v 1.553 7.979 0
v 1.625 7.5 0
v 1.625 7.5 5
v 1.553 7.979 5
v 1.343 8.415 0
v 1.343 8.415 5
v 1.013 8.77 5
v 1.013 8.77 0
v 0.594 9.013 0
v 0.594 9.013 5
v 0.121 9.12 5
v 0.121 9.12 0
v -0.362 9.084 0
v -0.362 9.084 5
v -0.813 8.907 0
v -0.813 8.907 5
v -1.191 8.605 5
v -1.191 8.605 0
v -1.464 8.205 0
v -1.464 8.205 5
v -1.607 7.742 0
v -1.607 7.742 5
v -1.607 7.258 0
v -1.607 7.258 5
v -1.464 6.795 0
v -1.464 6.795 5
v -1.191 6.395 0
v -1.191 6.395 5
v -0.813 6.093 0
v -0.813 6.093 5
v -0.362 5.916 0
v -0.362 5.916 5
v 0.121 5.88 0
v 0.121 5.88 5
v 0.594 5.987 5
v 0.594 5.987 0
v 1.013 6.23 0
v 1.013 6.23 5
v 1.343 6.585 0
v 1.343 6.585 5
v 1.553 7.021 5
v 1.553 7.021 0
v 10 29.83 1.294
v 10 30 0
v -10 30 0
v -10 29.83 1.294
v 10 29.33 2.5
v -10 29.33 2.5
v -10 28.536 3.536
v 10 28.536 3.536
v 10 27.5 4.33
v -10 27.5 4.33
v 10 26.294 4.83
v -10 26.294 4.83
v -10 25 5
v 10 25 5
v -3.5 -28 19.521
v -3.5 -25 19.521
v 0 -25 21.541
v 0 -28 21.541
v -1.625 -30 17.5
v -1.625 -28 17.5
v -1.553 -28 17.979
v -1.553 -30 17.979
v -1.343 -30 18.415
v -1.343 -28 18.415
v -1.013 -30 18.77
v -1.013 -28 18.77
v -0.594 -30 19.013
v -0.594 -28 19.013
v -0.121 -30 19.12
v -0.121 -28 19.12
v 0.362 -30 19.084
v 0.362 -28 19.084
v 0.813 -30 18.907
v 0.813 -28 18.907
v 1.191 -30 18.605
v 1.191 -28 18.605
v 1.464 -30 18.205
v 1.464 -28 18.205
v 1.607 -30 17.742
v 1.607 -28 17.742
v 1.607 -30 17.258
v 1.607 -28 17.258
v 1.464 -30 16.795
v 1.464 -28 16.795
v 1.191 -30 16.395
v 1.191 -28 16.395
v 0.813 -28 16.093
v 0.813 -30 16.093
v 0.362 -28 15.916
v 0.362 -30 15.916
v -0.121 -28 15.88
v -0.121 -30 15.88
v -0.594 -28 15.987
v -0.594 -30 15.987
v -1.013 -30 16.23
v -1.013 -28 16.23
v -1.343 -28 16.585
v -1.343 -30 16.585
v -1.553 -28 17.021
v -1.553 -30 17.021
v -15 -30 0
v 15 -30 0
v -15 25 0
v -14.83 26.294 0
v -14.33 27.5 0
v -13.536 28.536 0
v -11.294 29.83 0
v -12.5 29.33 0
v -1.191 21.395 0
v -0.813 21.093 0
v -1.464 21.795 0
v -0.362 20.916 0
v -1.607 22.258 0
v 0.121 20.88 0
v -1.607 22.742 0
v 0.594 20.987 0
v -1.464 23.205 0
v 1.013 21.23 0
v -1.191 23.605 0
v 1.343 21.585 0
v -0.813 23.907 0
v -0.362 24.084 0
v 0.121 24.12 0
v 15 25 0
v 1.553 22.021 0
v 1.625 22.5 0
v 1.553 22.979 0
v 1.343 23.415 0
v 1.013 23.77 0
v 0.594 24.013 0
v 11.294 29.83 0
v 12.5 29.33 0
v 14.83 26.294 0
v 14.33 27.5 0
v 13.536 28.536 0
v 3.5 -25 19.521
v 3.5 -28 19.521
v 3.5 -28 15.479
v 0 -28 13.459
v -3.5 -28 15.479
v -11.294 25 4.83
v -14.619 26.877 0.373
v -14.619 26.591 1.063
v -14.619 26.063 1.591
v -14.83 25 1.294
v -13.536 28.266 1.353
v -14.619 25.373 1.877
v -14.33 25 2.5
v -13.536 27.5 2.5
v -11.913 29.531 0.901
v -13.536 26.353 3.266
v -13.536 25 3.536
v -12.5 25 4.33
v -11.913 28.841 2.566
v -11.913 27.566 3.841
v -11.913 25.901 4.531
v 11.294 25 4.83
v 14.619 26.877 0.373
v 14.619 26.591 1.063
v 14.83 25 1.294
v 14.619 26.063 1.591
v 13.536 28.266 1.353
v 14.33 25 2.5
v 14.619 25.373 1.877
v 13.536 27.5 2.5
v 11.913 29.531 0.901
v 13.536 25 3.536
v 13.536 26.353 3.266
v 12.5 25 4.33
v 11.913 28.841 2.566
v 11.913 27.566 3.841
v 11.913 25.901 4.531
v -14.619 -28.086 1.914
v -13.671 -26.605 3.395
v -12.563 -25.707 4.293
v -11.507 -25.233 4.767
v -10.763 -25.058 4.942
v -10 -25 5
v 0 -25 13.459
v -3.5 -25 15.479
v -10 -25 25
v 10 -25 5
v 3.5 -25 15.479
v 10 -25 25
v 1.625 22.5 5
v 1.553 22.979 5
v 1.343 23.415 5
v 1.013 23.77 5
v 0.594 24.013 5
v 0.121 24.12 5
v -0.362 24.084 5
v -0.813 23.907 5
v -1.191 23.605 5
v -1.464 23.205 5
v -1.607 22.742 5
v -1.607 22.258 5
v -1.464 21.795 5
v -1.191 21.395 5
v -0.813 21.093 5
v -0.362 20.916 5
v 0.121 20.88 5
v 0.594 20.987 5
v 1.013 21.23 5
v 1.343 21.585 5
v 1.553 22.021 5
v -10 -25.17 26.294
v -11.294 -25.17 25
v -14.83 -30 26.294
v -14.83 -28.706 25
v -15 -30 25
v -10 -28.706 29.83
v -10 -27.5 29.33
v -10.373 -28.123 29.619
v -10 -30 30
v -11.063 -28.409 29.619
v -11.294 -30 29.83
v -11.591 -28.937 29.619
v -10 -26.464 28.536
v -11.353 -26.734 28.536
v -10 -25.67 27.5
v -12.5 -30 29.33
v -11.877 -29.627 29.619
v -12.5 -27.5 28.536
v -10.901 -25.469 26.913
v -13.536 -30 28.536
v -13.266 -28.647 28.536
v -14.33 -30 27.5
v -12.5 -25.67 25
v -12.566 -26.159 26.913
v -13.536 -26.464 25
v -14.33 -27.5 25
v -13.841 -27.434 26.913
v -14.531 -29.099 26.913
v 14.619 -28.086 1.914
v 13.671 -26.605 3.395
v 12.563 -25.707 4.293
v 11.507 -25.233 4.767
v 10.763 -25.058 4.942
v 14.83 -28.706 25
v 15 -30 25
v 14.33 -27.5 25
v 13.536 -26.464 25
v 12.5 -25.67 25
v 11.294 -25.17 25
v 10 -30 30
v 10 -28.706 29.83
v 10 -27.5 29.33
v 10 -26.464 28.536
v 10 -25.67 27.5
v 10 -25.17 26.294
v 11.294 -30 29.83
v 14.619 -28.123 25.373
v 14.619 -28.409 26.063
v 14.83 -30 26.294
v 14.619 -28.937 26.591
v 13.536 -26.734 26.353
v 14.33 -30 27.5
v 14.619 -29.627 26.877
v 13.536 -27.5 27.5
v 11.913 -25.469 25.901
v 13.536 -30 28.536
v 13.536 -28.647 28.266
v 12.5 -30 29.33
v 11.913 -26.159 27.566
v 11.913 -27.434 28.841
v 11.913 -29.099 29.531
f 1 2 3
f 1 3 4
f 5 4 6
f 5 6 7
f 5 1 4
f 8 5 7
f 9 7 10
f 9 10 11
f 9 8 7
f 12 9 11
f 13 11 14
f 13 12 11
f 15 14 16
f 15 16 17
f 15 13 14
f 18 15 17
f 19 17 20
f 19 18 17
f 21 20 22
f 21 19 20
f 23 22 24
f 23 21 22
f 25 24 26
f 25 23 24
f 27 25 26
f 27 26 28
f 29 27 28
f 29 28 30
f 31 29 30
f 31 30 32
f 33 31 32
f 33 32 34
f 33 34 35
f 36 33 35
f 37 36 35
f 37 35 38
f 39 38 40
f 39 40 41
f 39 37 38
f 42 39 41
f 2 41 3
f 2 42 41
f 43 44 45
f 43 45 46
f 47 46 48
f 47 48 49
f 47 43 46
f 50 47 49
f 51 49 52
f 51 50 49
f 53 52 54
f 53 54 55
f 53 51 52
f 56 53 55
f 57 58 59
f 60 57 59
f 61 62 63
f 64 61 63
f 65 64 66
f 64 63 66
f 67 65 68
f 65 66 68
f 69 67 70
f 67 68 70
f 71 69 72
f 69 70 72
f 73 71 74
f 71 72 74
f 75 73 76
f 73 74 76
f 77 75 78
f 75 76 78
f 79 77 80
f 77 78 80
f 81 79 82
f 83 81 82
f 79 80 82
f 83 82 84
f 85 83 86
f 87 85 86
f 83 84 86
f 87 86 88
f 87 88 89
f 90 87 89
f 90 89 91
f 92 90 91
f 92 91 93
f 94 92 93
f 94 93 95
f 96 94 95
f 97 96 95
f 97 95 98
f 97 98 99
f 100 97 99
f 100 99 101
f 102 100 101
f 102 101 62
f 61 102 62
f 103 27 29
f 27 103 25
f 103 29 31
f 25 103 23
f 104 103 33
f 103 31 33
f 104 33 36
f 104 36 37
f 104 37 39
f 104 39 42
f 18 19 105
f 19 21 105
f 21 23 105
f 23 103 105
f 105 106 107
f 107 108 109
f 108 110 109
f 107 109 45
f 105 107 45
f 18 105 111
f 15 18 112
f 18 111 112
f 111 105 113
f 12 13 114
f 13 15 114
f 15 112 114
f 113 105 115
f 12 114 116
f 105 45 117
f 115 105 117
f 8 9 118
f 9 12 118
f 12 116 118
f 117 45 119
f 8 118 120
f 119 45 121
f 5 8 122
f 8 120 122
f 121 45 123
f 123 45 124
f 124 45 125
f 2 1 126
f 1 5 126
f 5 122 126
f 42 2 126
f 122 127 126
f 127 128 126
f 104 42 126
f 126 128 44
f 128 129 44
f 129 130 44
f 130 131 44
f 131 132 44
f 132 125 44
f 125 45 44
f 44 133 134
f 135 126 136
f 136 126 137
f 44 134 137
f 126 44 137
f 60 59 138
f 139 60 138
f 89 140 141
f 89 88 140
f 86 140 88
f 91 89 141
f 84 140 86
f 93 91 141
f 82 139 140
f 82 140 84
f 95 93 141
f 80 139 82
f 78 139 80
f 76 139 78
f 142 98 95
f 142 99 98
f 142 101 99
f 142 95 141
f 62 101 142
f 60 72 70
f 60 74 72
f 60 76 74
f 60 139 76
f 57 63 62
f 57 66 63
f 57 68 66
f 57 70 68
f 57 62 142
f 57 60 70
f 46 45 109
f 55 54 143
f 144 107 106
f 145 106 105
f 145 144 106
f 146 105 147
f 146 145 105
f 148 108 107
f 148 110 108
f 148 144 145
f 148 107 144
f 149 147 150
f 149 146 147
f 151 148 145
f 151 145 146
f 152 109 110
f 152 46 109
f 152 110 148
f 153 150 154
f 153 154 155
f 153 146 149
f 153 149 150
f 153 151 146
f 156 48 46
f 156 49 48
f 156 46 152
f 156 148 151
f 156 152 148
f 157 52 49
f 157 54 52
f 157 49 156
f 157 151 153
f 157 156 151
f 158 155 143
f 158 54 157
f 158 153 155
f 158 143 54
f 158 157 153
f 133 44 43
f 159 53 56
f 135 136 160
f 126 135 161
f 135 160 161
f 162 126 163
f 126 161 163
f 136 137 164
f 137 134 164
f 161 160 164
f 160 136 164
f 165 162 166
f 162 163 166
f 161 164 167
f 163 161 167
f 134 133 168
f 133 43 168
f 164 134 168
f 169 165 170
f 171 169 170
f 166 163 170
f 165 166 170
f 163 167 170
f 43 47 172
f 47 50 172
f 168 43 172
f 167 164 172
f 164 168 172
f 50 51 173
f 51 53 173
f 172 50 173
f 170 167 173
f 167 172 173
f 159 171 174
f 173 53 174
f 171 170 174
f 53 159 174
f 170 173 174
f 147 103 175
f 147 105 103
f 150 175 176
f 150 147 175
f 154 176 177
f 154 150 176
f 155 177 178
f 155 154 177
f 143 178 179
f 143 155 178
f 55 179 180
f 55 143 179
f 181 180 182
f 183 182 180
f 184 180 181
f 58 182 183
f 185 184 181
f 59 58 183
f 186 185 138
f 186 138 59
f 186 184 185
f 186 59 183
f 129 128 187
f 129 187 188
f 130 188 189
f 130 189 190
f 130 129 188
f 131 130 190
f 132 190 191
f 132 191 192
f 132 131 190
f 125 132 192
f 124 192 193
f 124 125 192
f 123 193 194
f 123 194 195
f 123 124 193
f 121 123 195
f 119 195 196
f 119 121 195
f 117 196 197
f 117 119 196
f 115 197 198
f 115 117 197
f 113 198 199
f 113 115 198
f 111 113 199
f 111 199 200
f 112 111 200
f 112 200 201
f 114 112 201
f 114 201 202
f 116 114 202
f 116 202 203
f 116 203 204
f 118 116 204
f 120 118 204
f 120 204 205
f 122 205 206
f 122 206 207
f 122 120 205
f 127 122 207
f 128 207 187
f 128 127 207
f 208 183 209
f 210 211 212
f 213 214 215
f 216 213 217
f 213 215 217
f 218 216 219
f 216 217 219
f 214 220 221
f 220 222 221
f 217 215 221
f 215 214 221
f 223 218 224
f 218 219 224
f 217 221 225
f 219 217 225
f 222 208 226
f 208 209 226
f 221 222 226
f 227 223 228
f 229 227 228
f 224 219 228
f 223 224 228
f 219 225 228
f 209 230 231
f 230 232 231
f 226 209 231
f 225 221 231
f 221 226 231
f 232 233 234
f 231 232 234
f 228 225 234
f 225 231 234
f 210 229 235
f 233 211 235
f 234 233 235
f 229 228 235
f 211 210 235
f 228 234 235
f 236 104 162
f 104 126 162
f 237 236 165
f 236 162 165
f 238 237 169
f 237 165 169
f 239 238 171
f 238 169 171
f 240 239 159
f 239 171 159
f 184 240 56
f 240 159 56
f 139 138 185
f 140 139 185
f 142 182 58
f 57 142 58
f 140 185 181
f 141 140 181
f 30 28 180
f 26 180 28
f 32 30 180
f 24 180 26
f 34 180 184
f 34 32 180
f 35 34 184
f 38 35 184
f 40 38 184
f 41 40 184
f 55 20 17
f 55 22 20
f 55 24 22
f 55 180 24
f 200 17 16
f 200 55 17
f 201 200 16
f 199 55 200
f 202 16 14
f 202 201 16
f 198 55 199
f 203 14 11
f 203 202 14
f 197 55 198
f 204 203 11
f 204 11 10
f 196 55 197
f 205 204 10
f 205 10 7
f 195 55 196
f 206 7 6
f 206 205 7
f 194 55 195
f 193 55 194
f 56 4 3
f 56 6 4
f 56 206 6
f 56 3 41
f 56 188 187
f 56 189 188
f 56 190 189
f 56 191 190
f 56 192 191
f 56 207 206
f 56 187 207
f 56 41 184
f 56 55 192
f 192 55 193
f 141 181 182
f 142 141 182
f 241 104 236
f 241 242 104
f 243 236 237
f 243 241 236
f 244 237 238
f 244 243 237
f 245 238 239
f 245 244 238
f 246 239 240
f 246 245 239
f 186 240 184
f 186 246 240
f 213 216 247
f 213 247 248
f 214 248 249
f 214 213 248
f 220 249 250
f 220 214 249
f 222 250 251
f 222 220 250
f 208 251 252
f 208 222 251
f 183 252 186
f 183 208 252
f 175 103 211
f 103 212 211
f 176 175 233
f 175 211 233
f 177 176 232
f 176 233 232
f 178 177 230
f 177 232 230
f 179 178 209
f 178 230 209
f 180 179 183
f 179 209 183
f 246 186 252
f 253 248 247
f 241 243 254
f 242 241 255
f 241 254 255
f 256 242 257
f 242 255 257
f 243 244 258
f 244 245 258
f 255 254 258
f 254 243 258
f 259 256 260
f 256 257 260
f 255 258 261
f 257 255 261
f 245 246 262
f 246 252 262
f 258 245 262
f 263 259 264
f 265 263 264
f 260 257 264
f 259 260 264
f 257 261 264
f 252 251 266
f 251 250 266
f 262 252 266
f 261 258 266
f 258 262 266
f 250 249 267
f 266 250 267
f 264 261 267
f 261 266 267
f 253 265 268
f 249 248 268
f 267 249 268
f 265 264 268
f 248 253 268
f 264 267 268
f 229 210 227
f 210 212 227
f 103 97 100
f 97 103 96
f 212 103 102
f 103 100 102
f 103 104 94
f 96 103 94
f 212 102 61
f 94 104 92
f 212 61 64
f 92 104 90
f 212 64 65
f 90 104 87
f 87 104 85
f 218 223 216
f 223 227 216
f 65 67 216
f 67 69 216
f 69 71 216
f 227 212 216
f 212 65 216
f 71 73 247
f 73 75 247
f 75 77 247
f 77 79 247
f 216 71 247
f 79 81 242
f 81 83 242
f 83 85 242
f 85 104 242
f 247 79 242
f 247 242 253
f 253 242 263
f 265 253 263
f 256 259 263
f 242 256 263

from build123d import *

# Parameters (mm, degrees)
F0_W     = 30
F0_H     = 60
F0_R     = 1.625
F1_DEPTH = 5
F2_W     = 5
F2_H     = 25
F3_DEPTH = 30
F4_R     = 1.625
F5_DEPTH = 25
F6_R     = 1.625
F7_DEPTH = 3
F8_R     = 4.99999


# Not quite as in the source:
# - a fillet or chamfer is up to 0.001 mm smaller than in the source, because OpenCascade refuses the exact size


with BuildPart() as f1:
    # F0 (on Top) → F1 (new body)
    with BuildSketch(Plane.XY):
        Rectangle(F0_W, F0_H)
        with Locations((0, 7.5)):
            Circle(F0_R, mode=Mode.SUBTRACT)
        with Locations((0, 22.5)):
            Circle(F0_R, mode=Mode.SUBTRACT)
    extrude(amount=F1_DEPTH)

    # F2 (on face) → F3 (join)
    with BuildSketch(Plane.YZ.offset(15)):
        with Locations((-27.5, 17.5)):
            Rectangle(F2_W, F2_H)
    extrude(amount=-F3_DEPTH)

    # F4 (on face) → F5 (cut)
    with BuildSketch(Plane(origin=(0, -25, 0), x_dir=(-1, 0, 0), z_dir=(0, 1, 0))):
        with Locations((0, 17.5)):
            Circle(F4_R)
    extrude(amount=-F5_DEPTH, mode=Mode.SUBTRACT)

    # F6 (on face) → F7 (cut)
    with BuildSketch(Plane(origin=(0, -25, 0), x_dir=(-1, 0, 0), z_dir=(0, 1, 0))):
        Polygon((3.5, 15.4792740578), (3.5, 19.5207259422), (0, 21.5414518843), (-3.5, 19.5207259422), (-3.5, 15.4792740578), (0, 13.4585481157), align=None)
        with Locations((0, 17.5)):
            Circle(F6_R, mode=Mode.SUBTRACT)
    extrude(amount=-F7_DEPTH, mode=Mode.SUBTRACT)

    # F8 (radius 5 in the source; OpenCascade refuses exactly that, so slightly less here)
    f8_edges = [f1.edges().sort_by_distance(p)[0] for p in [
        (0, 30, 5),
        (15, 30, 2.5),
        (-15, 30, 2.5),
        (15, 2.5, 5),
        (-15, 2.5, 5),
        (-15, -25, 17.5),
        (0, -25, 30),
        (15, -25, 17.5),
        (-15, -27.5, 30),
        (15, -27.5, 30),
    ]]
    fillet(f8_edges, radius=F8_R)


solid = f1.part
